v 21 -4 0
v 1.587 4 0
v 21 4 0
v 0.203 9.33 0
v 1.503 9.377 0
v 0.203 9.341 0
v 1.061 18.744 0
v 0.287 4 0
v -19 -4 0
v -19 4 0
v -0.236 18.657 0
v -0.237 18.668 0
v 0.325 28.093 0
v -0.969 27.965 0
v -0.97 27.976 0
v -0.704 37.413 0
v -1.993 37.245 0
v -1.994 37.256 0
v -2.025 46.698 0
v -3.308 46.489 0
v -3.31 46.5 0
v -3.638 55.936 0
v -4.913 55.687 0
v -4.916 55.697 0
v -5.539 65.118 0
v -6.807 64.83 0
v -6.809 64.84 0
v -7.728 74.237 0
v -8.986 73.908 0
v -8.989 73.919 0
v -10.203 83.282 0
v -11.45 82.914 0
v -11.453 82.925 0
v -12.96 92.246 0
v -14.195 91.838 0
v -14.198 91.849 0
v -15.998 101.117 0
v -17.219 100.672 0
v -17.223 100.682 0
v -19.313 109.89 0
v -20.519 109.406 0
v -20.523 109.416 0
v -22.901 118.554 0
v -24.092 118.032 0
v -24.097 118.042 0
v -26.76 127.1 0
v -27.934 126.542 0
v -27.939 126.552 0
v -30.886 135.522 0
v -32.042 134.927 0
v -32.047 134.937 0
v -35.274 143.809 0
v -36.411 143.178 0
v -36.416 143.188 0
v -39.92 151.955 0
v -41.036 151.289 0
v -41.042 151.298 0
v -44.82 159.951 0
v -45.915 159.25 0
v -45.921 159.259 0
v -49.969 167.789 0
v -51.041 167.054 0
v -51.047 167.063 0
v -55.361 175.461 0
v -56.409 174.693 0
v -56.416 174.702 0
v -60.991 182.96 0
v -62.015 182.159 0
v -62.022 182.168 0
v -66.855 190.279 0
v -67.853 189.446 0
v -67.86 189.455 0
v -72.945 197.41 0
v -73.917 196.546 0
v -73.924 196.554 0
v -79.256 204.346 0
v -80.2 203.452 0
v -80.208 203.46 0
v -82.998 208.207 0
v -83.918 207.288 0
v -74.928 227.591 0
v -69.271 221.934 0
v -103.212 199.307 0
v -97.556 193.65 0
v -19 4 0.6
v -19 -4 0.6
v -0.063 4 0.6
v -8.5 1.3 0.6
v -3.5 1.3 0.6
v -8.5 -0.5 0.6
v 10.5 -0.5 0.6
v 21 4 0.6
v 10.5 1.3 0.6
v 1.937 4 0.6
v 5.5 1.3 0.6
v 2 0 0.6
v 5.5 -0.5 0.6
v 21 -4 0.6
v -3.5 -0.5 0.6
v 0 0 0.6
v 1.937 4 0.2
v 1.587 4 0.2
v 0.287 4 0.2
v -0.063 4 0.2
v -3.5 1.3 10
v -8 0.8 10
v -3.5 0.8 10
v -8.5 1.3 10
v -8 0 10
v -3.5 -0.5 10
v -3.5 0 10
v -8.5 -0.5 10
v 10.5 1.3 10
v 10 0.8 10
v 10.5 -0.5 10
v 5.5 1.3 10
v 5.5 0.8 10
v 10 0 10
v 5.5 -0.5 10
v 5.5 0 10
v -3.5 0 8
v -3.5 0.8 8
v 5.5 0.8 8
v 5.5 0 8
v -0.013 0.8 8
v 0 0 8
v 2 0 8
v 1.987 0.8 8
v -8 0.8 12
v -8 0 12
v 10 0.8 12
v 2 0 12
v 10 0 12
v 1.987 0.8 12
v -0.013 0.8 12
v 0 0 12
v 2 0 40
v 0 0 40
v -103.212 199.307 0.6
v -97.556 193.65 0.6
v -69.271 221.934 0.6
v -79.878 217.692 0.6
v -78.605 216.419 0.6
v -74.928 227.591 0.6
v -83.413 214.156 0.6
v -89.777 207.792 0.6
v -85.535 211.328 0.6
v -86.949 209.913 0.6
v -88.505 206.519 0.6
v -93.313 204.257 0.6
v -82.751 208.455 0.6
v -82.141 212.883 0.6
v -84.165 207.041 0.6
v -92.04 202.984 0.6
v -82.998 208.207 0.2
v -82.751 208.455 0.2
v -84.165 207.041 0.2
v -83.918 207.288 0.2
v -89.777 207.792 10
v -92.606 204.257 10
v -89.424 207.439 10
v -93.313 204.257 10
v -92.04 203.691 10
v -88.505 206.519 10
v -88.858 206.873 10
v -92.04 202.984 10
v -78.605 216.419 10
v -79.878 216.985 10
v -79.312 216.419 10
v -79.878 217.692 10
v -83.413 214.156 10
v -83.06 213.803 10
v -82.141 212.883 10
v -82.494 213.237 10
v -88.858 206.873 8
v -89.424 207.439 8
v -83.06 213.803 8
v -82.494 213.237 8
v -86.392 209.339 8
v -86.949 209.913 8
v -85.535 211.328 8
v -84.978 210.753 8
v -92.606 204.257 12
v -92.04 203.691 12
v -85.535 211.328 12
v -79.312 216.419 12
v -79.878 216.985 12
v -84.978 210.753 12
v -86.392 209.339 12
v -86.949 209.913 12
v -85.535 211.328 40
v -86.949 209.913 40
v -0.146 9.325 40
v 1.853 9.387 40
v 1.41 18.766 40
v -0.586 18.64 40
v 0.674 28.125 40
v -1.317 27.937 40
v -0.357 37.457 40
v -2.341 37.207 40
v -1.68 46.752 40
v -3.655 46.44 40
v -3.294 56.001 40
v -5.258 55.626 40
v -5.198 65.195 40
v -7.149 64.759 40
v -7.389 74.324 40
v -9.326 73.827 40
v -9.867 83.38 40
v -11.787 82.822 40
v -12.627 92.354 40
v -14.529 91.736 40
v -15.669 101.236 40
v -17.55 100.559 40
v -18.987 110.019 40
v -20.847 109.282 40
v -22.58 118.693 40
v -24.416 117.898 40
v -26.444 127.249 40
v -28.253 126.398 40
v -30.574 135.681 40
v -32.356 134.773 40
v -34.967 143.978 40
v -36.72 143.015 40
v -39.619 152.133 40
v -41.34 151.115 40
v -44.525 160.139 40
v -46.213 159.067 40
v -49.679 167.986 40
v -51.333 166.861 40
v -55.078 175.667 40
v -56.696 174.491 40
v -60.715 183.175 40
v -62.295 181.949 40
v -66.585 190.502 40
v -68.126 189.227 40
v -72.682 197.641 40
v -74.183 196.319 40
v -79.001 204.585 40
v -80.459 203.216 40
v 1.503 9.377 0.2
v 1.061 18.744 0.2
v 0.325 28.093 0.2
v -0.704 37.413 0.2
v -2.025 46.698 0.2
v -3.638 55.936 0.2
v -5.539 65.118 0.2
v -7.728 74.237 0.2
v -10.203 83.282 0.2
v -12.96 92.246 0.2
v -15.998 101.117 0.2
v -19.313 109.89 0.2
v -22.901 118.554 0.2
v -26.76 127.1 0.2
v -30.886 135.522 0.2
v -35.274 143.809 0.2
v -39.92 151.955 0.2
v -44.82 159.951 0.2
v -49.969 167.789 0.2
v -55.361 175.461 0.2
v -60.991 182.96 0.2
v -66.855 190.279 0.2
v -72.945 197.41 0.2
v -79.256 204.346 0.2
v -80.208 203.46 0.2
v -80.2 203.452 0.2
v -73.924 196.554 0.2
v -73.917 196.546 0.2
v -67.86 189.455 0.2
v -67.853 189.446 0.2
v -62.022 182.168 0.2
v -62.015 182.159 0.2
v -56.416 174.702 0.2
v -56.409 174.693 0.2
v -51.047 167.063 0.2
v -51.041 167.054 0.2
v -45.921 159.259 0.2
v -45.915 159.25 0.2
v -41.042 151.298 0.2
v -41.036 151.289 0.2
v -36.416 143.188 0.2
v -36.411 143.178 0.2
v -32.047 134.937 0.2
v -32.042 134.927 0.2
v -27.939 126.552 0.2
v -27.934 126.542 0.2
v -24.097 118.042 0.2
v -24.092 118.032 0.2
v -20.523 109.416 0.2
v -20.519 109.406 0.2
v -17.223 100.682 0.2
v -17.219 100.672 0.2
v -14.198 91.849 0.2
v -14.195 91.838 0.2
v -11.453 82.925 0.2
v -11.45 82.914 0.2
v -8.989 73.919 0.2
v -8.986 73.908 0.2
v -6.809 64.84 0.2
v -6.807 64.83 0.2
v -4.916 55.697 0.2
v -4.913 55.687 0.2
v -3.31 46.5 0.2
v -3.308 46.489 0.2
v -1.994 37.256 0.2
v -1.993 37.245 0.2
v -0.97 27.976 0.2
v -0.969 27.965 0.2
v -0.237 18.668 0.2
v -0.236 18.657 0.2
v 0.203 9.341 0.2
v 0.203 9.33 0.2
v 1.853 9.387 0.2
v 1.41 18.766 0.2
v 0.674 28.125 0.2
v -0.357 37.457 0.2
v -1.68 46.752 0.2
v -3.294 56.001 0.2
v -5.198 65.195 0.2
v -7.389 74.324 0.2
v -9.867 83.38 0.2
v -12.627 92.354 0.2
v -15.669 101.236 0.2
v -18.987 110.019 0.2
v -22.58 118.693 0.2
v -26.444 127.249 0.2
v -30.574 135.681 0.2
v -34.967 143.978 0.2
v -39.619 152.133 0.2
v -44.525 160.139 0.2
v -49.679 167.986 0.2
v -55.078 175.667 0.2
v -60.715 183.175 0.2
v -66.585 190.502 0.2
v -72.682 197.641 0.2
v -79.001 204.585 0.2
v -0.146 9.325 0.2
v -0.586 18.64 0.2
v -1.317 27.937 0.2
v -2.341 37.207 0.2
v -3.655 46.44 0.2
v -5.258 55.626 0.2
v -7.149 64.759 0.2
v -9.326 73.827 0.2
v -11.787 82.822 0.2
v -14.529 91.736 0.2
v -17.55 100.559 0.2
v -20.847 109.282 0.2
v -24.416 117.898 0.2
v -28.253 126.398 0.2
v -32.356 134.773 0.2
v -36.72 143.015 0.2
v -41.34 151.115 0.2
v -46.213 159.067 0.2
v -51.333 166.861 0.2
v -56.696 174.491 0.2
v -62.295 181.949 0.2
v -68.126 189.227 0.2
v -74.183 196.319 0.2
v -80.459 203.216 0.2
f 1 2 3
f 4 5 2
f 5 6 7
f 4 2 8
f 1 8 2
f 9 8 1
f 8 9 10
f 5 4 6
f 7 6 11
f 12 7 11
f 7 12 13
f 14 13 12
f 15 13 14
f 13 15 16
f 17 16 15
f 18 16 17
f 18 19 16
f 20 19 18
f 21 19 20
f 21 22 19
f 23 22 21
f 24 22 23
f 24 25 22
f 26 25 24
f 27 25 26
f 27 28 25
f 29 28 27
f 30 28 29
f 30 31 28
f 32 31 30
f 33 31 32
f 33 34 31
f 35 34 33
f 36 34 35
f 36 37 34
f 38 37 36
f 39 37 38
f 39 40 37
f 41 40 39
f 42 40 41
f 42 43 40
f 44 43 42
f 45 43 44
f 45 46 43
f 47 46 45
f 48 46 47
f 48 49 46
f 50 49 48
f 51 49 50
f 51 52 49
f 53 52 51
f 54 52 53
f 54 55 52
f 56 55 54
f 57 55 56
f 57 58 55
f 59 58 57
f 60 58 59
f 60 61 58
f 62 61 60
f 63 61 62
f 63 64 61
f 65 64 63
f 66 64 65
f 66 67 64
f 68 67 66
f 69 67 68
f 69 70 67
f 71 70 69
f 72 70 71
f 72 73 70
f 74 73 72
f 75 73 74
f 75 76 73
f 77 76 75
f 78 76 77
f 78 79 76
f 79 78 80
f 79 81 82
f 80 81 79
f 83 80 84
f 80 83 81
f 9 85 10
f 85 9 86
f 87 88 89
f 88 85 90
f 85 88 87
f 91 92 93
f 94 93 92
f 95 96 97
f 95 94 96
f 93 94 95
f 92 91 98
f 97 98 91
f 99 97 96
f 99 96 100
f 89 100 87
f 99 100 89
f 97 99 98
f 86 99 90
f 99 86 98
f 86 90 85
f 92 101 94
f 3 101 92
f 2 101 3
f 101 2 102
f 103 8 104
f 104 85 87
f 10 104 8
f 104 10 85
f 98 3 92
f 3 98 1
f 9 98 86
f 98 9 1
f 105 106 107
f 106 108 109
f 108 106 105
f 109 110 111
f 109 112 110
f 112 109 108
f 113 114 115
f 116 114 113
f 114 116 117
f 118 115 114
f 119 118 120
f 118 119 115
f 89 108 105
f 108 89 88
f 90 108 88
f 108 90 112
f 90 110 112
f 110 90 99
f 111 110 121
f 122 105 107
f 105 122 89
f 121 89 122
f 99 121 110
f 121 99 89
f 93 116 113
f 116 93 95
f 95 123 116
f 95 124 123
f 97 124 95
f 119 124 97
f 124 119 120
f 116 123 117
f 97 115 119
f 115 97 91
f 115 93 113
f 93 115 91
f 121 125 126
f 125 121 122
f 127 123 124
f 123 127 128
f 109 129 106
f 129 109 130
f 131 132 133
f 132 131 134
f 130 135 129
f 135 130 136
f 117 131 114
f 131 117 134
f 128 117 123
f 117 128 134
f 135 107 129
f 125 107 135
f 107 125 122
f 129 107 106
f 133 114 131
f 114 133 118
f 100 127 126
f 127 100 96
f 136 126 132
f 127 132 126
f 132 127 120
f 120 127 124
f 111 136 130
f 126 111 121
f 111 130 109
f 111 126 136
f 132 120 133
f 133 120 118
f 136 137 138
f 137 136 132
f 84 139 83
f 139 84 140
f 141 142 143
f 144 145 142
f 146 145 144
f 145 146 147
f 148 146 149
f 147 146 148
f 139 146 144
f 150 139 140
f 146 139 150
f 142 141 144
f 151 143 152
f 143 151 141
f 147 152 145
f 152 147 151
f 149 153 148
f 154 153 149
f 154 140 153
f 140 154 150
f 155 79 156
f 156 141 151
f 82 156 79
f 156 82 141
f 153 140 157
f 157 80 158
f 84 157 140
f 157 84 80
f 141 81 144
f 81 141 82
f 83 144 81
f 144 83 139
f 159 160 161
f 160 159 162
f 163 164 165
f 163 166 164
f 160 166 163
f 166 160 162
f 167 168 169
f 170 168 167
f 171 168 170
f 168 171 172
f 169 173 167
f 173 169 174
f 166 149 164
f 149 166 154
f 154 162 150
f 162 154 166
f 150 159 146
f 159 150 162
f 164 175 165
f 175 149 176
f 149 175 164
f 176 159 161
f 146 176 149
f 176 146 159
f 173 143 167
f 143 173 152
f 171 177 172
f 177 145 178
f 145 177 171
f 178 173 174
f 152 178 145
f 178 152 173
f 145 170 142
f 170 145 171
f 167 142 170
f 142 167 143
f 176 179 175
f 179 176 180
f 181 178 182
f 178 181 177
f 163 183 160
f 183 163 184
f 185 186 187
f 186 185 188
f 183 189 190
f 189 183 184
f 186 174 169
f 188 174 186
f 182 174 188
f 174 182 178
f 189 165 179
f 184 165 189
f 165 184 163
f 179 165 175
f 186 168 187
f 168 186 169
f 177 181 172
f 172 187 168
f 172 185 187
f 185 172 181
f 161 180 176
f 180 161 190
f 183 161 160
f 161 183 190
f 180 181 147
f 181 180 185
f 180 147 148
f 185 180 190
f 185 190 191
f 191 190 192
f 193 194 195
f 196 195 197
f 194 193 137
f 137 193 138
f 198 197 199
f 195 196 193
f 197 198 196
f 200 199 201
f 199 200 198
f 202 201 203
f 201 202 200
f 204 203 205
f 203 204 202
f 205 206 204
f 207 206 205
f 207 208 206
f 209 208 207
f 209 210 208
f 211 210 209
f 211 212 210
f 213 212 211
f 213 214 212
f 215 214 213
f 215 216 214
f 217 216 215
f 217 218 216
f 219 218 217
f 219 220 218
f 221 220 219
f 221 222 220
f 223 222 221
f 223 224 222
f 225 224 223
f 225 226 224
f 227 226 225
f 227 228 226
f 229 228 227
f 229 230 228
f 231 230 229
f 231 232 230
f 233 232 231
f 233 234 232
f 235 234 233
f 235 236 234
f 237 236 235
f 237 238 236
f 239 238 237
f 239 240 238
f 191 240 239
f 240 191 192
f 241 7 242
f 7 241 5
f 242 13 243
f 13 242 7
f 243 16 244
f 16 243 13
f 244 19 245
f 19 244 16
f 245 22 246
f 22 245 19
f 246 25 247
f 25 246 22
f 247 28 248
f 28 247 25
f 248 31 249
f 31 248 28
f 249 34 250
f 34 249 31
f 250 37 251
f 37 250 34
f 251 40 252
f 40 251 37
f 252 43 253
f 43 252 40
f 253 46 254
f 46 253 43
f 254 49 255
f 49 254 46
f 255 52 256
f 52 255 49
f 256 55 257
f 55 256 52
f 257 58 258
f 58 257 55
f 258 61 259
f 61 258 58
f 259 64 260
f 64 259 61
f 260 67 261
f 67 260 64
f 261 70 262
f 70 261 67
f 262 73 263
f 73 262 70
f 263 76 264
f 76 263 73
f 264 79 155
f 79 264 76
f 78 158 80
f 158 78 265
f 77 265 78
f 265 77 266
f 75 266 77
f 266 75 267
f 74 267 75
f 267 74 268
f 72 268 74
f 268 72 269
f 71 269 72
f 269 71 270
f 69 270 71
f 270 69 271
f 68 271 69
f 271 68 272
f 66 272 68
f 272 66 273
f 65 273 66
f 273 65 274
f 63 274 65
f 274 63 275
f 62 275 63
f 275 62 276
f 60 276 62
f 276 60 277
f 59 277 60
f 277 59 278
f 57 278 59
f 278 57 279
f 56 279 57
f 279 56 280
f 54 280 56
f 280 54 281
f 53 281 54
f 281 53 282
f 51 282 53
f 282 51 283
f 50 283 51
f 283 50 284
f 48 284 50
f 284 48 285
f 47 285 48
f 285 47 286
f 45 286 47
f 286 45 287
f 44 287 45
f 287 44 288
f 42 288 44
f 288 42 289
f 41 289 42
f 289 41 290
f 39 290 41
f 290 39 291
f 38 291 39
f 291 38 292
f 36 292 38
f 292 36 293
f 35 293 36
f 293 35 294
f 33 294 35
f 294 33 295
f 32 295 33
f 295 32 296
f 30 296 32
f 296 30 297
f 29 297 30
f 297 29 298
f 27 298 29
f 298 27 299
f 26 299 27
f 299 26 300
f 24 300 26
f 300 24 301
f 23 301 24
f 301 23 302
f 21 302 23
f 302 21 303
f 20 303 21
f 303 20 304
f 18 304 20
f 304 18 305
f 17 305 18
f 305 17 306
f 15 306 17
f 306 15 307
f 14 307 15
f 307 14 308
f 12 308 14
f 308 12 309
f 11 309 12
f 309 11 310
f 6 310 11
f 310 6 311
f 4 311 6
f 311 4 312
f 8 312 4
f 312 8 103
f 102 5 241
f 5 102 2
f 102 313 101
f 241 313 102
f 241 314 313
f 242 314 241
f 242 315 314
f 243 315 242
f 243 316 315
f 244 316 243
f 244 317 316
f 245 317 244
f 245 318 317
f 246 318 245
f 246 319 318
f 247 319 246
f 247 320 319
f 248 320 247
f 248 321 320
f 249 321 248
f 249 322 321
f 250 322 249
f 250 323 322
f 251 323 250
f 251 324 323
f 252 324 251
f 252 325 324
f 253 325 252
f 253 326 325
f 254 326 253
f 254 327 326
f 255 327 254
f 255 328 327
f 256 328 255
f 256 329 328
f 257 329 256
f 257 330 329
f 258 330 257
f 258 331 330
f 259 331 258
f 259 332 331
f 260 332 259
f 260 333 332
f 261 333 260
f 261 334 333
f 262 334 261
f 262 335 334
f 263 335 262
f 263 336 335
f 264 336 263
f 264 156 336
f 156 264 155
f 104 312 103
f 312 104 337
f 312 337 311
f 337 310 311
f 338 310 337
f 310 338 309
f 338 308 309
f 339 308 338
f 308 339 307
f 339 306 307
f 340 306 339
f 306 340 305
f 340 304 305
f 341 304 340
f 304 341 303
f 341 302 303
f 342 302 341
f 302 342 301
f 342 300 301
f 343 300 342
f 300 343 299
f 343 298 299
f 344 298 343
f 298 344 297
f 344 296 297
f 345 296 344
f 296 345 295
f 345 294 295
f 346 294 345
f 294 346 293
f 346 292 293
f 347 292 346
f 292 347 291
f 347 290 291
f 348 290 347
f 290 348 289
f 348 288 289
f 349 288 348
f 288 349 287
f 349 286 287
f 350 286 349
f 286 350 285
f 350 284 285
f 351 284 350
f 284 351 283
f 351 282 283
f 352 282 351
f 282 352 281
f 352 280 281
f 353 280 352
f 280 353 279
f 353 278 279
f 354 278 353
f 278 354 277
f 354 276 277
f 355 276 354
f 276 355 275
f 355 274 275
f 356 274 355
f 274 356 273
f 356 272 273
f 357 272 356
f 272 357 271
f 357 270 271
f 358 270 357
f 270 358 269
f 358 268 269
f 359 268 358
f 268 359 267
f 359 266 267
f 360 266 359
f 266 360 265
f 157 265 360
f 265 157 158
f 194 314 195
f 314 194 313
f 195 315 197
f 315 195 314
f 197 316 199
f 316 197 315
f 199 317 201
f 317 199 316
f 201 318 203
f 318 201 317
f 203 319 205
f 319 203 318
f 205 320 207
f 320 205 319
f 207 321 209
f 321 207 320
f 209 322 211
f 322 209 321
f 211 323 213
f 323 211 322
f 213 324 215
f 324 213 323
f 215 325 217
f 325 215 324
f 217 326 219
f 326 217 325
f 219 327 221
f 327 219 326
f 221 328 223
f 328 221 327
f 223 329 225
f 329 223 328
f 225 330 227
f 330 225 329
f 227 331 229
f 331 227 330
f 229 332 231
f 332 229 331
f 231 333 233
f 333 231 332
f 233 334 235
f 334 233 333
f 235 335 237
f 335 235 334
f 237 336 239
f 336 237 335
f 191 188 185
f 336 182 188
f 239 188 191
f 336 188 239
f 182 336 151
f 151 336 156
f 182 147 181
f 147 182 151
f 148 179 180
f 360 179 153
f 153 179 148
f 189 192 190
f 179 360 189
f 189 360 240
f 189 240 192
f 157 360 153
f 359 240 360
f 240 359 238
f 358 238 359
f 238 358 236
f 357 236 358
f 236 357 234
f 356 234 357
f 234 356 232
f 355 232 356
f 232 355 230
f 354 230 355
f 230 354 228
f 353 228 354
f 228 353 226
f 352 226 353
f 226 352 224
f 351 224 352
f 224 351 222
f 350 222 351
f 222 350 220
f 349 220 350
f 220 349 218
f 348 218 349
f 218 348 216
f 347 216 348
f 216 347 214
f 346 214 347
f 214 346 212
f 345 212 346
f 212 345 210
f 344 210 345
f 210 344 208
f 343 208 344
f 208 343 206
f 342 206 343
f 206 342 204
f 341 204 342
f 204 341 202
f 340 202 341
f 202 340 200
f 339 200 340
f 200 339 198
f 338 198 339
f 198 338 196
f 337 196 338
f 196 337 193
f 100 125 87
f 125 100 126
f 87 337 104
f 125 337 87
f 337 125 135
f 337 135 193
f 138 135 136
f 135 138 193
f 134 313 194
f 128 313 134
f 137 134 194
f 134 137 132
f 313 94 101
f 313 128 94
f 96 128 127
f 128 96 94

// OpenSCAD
$fn = 200;

wall = 2;
id = 2 * (11 + 11/16) * 25.4;
height = 40;

module piece_2d(angle) {
  intersection() {
    difference() {
      circle(d=id+2*wall);
      circle(d=id);
    }
    polygon(1000 * [
      [0, 0],
      [1, 0],
      [cos(angle), sin(angle)],
    ]);
  }
}

module tag() {
  // Floor.
  linear_extrude(0.6)
    translate([(id+wall)/2, 0])
      square([40, 8], center=true);
  
  // Riser.
  linear_extrude(10)
    for (x = [-wall/2-6, wall/2+6])
      translate([(id+wall)/2 + x, 0.4])
        square([5, 1.8], center=true);
    
  // Bridge.
  translate([(id+wall)/2, 0.4, 8])
    linear_extrude(4)
      square([16 + wall, 0.8], center=true);
}

module piece(angle) {
  linear_extrude(height)
    offset(-0.35)
      piece_2d(angle);
  translate([0, 0, 0.2])
    linear_extrude(height-0.2)
      piece_2d(angle);
  
  tag();
  rotate([0, 0, angle])
    mirror([0, 1, 0])
      tag();
}

translate([-id/2, 0])
  piece(45);
